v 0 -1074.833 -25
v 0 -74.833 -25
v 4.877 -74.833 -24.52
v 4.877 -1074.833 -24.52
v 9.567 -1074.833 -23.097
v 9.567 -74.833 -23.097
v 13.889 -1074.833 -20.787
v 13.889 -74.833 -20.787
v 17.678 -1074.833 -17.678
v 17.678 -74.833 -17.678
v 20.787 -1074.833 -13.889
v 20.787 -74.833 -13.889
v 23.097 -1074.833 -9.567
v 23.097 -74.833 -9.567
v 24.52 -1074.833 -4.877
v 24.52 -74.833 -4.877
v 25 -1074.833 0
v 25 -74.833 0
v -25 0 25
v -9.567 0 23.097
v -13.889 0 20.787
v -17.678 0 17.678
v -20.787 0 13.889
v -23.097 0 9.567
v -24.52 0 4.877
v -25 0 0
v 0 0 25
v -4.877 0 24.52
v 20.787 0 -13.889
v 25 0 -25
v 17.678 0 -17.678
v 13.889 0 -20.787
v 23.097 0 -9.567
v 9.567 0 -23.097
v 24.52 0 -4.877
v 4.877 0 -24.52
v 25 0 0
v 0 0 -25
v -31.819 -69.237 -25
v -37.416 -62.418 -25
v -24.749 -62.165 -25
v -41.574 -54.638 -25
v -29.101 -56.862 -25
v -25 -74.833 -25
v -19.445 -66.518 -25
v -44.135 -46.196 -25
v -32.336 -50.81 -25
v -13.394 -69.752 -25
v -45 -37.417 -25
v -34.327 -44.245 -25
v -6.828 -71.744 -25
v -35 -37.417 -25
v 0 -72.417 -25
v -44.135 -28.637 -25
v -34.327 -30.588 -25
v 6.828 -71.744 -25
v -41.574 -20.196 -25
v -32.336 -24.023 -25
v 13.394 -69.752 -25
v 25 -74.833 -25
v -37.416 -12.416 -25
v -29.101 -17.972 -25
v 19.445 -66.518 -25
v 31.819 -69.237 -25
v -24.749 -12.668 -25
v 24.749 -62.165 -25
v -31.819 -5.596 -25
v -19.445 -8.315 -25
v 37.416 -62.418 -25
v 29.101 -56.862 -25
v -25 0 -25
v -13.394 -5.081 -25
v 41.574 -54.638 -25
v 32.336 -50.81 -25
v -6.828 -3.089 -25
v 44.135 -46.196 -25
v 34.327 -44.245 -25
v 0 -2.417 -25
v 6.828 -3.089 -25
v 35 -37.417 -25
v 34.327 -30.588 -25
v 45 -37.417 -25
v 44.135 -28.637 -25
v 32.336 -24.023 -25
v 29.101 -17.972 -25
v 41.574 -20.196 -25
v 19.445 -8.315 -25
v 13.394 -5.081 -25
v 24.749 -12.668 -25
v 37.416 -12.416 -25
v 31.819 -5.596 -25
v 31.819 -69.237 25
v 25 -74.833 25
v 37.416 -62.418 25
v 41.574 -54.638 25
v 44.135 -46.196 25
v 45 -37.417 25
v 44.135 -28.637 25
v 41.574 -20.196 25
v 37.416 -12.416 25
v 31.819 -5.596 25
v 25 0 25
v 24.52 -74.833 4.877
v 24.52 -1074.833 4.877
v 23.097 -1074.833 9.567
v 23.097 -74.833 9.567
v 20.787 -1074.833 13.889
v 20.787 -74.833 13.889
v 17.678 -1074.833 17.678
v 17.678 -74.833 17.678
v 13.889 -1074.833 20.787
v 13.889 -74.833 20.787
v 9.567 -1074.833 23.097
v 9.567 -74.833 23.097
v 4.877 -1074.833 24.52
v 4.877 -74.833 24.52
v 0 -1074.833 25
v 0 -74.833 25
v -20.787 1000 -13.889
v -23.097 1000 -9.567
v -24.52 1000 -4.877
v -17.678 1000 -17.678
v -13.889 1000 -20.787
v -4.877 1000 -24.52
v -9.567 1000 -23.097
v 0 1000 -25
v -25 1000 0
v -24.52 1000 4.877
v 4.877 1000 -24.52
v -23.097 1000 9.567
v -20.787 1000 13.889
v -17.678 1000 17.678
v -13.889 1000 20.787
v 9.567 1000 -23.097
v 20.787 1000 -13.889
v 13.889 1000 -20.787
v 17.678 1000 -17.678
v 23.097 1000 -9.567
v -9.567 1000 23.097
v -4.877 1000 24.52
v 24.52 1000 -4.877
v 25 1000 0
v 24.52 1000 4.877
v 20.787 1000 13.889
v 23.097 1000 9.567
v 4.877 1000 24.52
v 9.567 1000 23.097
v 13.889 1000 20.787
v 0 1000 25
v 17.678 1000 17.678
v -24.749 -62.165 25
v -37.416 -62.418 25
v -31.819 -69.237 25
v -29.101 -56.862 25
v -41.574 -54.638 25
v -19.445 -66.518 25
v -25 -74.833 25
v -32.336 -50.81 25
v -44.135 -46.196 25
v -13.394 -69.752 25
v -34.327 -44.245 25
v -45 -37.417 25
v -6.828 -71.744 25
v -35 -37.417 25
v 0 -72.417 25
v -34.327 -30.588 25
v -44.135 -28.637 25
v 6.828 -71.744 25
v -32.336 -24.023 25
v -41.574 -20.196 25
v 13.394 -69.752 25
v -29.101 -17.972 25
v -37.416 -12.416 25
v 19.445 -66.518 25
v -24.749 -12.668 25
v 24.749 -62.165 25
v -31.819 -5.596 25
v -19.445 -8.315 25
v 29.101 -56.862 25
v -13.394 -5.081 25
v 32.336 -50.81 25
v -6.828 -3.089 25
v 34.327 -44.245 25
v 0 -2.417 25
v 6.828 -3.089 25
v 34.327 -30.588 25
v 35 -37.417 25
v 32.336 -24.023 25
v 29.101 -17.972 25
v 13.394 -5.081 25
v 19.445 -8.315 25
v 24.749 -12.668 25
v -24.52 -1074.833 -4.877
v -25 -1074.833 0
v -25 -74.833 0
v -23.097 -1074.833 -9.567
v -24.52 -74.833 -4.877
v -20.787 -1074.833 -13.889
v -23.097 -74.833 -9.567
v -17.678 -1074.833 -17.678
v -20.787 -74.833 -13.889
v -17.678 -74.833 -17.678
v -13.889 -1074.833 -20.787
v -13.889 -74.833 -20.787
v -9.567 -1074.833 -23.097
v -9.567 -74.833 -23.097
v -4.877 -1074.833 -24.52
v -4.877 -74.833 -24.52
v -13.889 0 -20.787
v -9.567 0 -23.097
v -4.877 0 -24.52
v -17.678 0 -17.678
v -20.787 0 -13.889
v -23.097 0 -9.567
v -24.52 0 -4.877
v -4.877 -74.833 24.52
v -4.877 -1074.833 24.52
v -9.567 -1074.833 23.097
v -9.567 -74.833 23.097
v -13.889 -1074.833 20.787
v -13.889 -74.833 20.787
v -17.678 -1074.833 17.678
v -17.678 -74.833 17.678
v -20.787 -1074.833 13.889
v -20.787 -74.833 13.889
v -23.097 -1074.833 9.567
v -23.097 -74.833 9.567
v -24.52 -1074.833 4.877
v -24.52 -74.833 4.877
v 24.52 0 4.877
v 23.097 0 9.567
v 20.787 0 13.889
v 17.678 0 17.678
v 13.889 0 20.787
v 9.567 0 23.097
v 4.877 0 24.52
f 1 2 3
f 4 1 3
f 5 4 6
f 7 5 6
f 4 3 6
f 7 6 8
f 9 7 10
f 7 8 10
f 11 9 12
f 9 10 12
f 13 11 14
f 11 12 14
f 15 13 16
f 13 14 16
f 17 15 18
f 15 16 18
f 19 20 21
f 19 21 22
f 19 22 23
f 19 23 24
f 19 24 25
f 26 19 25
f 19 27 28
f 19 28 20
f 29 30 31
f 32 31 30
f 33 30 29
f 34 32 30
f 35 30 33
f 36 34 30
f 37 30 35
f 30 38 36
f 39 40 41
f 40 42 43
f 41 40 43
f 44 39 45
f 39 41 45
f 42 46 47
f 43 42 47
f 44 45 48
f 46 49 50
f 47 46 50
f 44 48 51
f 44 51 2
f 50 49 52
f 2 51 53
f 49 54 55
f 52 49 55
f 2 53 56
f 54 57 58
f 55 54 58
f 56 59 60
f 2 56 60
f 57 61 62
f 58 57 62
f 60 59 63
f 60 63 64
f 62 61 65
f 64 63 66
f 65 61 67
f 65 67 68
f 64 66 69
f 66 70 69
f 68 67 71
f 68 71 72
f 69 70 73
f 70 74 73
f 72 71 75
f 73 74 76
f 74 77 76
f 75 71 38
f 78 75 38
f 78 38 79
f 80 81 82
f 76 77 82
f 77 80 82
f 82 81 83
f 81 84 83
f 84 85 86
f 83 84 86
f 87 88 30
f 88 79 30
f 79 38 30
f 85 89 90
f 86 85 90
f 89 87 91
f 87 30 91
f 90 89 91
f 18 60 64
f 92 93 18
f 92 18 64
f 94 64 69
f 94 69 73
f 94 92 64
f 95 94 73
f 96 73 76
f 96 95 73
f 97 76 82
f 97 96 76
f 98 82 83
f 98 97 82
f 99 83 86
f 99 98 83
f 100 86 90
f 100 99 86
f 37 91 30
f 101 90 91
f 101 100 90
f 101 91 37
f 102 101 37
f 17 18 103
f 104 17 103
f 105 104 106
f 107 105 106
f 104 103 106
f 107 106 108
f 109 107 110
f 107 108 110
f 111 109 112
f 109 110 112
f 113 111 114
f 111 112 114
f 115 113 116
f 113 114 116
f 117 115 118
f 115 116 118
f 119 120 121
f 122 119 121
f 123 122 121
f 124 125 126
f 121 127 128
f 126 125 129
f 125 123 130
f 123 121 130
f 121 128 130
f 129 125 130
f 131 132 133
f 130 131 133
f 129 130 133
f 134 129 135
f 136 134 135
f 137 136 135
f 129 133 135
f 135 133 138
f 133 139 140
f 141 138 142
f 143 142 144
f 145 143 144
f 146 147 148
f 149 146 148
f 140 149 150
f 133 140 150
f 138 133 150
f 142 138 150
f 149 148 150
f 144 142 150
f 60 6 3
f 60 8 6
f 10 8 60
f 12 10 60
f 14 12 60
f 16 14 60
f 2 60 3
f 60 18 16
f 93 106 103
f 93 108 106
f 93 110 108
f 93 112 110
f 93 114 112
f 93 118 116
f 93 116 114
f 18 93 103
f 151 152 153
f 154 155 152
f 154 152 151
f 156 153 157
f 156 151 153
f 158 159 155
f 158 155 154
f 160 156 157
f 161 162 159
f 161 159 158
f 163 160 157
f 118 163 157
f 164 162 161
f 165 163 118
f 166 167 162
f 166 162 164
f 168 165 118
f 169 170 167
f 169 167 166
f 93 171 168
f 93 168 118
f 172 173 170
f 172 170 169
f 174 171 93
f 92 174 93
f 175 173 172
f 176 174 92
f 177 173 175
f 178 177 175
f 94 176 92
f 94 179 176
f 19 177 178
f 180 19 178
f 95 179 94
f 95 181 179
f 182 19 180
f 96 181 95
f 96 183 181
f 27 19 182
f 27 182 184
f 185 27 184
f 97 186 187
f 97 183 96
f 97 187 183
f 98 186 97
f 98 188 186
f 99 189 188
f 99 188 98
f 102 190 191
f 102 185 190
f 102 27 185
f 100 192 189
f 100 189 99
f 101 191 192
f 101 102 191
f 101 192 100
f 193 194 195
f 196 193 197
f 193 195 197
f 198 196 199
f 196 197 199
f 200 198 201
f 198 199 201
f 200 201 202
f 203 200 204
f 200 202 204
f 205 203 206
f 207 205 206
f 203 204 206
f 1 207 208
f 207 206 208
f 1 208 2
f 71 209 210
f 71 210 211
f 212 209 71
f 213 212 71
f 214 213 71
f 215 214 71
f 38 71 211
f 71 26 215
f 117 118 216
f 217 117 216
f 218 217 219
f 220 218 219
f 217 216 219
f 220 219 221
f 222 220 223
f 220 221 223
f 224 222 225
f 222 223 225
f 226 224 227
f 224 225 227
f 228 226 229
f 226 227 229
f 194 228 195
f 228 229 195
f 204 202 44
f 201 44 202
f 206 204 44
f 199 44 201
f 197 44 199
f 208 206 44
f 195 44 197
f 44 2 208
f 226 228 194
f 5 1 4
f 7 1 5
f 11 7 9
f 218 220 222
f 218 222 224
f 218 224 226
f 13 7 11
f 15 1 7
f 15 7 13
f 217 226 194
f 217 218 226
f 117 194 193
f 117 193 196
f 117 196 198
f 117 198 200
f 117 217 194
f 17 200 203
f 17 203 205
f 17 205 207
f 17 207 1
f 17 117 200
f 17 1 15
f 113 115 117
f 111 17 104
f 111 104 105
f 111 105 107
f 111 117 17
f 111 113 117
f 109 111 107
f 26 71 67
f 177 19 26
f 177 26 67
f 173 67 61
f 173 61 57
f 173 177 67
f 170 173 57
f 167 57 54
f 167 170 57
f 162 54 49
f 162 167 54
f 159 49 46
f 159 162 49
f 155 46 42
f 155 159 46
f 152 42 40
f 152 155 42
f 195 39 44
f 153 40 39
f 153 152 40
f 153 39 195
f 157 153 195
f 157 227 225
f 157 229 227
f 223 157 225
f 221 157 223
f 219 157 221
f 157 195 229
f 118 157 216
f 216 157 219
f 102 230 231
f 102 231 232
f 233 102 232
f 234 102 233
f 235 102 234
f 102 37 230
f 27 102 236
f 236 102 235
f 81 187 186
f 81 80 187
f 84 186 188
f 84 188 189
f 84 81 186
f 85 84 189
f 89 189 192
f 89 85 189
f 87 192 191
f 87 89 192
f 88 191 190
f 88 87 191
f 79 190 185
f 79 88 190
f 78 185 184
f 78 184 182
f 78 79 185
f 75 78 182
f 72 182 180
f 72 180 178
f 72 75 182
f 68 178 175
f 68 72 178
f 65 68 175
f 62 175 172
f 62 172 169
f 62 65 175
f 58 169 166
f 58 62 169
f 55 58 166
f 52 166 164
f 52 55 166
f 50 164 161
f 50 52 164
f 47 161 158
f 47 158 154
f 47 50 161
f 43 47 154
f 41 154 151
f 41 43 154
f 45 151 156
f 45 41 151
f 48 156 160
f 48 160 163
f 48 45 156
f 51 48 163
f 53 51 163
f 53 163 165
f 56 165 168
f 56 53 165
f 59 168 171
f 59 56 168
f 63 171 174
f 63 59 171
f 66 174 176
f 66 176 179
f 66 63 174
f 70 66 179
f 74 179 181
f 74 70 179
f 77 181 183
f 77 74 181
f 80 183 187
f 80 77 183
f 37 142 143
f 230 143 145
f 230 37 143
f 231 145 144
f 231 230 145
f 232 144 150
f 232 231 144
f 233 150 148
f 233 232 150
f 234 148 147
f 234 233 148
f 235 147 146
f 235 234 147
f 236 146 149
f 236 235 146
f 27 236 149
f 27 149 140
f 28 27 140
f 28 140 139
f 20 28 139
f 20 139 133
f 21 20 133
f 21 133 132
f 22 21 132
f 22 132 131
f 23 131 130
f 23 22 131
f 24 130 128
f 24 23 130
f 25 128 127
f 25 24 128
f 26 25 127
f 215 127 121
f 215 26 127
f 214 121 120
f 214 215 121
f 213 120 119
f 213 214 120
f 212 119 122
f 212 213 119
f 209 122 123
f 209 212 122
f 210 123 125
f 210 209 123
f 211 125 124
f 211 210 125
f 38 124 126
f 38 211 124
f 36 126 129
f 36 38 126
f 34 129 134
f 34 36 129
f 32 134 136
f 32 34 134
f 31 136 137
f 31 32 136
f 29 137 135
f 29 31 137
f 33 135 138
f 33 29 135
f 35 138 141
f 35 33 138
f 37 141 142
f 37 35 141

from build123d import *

# Parameters (mm, degrees)
F0_R     = 25
F1_DEPTH = 1000
F2_R     = 35
F3_DEPTH = 25
F5_DEPTH = 1000


with BuildPart() as f1:
    # F0 (on Front) → F1 (new body)
    with BuildSketch(Plane.XZ):
        Circle(F0_R)
    extrude(amount=-F1_DEPTH)

    # F2 (on Top) → F3 (join, symmetric)
    with BuildSketch(Plane.XY):
        with BuildLine():
            Line((25, 0), (-25, 0))
            ThreePointArc((-25, 0), (-45, -37.416574), (-25, -74.833148))
            Line((-25, -74.833148), (25, -74.833148))
            ThreePointArc((25, -74.833148), (45, -37.416574), (25, 0))
        make_face()
        with Locations((0, -37.416574)):
            Circle(F2_R, mode=Mode.SUBTRACT)
    extrude(amount=F3_DEPTH, both=True)

    # F4 (on face) → F5 (join)
    with BuildSketch(Plane.XZ.offset(74.833148)):
        with BuildLine():
            ThreePointArc((0, -25), (17.67767, -17.67767), (25, 0))
            ThreePointArc((25, 0), (17.67767, 17.67767), (0, 25))
            ThreePointArc((0, 25), (-17.67767, 17.67767), (-25, 0))
            ThreePointArc((-25, 0), (-17.67767, -17.677669), (0, -25))
        make_face()
    extrude(amount=F5_DEPTH)


solid = f1.part
